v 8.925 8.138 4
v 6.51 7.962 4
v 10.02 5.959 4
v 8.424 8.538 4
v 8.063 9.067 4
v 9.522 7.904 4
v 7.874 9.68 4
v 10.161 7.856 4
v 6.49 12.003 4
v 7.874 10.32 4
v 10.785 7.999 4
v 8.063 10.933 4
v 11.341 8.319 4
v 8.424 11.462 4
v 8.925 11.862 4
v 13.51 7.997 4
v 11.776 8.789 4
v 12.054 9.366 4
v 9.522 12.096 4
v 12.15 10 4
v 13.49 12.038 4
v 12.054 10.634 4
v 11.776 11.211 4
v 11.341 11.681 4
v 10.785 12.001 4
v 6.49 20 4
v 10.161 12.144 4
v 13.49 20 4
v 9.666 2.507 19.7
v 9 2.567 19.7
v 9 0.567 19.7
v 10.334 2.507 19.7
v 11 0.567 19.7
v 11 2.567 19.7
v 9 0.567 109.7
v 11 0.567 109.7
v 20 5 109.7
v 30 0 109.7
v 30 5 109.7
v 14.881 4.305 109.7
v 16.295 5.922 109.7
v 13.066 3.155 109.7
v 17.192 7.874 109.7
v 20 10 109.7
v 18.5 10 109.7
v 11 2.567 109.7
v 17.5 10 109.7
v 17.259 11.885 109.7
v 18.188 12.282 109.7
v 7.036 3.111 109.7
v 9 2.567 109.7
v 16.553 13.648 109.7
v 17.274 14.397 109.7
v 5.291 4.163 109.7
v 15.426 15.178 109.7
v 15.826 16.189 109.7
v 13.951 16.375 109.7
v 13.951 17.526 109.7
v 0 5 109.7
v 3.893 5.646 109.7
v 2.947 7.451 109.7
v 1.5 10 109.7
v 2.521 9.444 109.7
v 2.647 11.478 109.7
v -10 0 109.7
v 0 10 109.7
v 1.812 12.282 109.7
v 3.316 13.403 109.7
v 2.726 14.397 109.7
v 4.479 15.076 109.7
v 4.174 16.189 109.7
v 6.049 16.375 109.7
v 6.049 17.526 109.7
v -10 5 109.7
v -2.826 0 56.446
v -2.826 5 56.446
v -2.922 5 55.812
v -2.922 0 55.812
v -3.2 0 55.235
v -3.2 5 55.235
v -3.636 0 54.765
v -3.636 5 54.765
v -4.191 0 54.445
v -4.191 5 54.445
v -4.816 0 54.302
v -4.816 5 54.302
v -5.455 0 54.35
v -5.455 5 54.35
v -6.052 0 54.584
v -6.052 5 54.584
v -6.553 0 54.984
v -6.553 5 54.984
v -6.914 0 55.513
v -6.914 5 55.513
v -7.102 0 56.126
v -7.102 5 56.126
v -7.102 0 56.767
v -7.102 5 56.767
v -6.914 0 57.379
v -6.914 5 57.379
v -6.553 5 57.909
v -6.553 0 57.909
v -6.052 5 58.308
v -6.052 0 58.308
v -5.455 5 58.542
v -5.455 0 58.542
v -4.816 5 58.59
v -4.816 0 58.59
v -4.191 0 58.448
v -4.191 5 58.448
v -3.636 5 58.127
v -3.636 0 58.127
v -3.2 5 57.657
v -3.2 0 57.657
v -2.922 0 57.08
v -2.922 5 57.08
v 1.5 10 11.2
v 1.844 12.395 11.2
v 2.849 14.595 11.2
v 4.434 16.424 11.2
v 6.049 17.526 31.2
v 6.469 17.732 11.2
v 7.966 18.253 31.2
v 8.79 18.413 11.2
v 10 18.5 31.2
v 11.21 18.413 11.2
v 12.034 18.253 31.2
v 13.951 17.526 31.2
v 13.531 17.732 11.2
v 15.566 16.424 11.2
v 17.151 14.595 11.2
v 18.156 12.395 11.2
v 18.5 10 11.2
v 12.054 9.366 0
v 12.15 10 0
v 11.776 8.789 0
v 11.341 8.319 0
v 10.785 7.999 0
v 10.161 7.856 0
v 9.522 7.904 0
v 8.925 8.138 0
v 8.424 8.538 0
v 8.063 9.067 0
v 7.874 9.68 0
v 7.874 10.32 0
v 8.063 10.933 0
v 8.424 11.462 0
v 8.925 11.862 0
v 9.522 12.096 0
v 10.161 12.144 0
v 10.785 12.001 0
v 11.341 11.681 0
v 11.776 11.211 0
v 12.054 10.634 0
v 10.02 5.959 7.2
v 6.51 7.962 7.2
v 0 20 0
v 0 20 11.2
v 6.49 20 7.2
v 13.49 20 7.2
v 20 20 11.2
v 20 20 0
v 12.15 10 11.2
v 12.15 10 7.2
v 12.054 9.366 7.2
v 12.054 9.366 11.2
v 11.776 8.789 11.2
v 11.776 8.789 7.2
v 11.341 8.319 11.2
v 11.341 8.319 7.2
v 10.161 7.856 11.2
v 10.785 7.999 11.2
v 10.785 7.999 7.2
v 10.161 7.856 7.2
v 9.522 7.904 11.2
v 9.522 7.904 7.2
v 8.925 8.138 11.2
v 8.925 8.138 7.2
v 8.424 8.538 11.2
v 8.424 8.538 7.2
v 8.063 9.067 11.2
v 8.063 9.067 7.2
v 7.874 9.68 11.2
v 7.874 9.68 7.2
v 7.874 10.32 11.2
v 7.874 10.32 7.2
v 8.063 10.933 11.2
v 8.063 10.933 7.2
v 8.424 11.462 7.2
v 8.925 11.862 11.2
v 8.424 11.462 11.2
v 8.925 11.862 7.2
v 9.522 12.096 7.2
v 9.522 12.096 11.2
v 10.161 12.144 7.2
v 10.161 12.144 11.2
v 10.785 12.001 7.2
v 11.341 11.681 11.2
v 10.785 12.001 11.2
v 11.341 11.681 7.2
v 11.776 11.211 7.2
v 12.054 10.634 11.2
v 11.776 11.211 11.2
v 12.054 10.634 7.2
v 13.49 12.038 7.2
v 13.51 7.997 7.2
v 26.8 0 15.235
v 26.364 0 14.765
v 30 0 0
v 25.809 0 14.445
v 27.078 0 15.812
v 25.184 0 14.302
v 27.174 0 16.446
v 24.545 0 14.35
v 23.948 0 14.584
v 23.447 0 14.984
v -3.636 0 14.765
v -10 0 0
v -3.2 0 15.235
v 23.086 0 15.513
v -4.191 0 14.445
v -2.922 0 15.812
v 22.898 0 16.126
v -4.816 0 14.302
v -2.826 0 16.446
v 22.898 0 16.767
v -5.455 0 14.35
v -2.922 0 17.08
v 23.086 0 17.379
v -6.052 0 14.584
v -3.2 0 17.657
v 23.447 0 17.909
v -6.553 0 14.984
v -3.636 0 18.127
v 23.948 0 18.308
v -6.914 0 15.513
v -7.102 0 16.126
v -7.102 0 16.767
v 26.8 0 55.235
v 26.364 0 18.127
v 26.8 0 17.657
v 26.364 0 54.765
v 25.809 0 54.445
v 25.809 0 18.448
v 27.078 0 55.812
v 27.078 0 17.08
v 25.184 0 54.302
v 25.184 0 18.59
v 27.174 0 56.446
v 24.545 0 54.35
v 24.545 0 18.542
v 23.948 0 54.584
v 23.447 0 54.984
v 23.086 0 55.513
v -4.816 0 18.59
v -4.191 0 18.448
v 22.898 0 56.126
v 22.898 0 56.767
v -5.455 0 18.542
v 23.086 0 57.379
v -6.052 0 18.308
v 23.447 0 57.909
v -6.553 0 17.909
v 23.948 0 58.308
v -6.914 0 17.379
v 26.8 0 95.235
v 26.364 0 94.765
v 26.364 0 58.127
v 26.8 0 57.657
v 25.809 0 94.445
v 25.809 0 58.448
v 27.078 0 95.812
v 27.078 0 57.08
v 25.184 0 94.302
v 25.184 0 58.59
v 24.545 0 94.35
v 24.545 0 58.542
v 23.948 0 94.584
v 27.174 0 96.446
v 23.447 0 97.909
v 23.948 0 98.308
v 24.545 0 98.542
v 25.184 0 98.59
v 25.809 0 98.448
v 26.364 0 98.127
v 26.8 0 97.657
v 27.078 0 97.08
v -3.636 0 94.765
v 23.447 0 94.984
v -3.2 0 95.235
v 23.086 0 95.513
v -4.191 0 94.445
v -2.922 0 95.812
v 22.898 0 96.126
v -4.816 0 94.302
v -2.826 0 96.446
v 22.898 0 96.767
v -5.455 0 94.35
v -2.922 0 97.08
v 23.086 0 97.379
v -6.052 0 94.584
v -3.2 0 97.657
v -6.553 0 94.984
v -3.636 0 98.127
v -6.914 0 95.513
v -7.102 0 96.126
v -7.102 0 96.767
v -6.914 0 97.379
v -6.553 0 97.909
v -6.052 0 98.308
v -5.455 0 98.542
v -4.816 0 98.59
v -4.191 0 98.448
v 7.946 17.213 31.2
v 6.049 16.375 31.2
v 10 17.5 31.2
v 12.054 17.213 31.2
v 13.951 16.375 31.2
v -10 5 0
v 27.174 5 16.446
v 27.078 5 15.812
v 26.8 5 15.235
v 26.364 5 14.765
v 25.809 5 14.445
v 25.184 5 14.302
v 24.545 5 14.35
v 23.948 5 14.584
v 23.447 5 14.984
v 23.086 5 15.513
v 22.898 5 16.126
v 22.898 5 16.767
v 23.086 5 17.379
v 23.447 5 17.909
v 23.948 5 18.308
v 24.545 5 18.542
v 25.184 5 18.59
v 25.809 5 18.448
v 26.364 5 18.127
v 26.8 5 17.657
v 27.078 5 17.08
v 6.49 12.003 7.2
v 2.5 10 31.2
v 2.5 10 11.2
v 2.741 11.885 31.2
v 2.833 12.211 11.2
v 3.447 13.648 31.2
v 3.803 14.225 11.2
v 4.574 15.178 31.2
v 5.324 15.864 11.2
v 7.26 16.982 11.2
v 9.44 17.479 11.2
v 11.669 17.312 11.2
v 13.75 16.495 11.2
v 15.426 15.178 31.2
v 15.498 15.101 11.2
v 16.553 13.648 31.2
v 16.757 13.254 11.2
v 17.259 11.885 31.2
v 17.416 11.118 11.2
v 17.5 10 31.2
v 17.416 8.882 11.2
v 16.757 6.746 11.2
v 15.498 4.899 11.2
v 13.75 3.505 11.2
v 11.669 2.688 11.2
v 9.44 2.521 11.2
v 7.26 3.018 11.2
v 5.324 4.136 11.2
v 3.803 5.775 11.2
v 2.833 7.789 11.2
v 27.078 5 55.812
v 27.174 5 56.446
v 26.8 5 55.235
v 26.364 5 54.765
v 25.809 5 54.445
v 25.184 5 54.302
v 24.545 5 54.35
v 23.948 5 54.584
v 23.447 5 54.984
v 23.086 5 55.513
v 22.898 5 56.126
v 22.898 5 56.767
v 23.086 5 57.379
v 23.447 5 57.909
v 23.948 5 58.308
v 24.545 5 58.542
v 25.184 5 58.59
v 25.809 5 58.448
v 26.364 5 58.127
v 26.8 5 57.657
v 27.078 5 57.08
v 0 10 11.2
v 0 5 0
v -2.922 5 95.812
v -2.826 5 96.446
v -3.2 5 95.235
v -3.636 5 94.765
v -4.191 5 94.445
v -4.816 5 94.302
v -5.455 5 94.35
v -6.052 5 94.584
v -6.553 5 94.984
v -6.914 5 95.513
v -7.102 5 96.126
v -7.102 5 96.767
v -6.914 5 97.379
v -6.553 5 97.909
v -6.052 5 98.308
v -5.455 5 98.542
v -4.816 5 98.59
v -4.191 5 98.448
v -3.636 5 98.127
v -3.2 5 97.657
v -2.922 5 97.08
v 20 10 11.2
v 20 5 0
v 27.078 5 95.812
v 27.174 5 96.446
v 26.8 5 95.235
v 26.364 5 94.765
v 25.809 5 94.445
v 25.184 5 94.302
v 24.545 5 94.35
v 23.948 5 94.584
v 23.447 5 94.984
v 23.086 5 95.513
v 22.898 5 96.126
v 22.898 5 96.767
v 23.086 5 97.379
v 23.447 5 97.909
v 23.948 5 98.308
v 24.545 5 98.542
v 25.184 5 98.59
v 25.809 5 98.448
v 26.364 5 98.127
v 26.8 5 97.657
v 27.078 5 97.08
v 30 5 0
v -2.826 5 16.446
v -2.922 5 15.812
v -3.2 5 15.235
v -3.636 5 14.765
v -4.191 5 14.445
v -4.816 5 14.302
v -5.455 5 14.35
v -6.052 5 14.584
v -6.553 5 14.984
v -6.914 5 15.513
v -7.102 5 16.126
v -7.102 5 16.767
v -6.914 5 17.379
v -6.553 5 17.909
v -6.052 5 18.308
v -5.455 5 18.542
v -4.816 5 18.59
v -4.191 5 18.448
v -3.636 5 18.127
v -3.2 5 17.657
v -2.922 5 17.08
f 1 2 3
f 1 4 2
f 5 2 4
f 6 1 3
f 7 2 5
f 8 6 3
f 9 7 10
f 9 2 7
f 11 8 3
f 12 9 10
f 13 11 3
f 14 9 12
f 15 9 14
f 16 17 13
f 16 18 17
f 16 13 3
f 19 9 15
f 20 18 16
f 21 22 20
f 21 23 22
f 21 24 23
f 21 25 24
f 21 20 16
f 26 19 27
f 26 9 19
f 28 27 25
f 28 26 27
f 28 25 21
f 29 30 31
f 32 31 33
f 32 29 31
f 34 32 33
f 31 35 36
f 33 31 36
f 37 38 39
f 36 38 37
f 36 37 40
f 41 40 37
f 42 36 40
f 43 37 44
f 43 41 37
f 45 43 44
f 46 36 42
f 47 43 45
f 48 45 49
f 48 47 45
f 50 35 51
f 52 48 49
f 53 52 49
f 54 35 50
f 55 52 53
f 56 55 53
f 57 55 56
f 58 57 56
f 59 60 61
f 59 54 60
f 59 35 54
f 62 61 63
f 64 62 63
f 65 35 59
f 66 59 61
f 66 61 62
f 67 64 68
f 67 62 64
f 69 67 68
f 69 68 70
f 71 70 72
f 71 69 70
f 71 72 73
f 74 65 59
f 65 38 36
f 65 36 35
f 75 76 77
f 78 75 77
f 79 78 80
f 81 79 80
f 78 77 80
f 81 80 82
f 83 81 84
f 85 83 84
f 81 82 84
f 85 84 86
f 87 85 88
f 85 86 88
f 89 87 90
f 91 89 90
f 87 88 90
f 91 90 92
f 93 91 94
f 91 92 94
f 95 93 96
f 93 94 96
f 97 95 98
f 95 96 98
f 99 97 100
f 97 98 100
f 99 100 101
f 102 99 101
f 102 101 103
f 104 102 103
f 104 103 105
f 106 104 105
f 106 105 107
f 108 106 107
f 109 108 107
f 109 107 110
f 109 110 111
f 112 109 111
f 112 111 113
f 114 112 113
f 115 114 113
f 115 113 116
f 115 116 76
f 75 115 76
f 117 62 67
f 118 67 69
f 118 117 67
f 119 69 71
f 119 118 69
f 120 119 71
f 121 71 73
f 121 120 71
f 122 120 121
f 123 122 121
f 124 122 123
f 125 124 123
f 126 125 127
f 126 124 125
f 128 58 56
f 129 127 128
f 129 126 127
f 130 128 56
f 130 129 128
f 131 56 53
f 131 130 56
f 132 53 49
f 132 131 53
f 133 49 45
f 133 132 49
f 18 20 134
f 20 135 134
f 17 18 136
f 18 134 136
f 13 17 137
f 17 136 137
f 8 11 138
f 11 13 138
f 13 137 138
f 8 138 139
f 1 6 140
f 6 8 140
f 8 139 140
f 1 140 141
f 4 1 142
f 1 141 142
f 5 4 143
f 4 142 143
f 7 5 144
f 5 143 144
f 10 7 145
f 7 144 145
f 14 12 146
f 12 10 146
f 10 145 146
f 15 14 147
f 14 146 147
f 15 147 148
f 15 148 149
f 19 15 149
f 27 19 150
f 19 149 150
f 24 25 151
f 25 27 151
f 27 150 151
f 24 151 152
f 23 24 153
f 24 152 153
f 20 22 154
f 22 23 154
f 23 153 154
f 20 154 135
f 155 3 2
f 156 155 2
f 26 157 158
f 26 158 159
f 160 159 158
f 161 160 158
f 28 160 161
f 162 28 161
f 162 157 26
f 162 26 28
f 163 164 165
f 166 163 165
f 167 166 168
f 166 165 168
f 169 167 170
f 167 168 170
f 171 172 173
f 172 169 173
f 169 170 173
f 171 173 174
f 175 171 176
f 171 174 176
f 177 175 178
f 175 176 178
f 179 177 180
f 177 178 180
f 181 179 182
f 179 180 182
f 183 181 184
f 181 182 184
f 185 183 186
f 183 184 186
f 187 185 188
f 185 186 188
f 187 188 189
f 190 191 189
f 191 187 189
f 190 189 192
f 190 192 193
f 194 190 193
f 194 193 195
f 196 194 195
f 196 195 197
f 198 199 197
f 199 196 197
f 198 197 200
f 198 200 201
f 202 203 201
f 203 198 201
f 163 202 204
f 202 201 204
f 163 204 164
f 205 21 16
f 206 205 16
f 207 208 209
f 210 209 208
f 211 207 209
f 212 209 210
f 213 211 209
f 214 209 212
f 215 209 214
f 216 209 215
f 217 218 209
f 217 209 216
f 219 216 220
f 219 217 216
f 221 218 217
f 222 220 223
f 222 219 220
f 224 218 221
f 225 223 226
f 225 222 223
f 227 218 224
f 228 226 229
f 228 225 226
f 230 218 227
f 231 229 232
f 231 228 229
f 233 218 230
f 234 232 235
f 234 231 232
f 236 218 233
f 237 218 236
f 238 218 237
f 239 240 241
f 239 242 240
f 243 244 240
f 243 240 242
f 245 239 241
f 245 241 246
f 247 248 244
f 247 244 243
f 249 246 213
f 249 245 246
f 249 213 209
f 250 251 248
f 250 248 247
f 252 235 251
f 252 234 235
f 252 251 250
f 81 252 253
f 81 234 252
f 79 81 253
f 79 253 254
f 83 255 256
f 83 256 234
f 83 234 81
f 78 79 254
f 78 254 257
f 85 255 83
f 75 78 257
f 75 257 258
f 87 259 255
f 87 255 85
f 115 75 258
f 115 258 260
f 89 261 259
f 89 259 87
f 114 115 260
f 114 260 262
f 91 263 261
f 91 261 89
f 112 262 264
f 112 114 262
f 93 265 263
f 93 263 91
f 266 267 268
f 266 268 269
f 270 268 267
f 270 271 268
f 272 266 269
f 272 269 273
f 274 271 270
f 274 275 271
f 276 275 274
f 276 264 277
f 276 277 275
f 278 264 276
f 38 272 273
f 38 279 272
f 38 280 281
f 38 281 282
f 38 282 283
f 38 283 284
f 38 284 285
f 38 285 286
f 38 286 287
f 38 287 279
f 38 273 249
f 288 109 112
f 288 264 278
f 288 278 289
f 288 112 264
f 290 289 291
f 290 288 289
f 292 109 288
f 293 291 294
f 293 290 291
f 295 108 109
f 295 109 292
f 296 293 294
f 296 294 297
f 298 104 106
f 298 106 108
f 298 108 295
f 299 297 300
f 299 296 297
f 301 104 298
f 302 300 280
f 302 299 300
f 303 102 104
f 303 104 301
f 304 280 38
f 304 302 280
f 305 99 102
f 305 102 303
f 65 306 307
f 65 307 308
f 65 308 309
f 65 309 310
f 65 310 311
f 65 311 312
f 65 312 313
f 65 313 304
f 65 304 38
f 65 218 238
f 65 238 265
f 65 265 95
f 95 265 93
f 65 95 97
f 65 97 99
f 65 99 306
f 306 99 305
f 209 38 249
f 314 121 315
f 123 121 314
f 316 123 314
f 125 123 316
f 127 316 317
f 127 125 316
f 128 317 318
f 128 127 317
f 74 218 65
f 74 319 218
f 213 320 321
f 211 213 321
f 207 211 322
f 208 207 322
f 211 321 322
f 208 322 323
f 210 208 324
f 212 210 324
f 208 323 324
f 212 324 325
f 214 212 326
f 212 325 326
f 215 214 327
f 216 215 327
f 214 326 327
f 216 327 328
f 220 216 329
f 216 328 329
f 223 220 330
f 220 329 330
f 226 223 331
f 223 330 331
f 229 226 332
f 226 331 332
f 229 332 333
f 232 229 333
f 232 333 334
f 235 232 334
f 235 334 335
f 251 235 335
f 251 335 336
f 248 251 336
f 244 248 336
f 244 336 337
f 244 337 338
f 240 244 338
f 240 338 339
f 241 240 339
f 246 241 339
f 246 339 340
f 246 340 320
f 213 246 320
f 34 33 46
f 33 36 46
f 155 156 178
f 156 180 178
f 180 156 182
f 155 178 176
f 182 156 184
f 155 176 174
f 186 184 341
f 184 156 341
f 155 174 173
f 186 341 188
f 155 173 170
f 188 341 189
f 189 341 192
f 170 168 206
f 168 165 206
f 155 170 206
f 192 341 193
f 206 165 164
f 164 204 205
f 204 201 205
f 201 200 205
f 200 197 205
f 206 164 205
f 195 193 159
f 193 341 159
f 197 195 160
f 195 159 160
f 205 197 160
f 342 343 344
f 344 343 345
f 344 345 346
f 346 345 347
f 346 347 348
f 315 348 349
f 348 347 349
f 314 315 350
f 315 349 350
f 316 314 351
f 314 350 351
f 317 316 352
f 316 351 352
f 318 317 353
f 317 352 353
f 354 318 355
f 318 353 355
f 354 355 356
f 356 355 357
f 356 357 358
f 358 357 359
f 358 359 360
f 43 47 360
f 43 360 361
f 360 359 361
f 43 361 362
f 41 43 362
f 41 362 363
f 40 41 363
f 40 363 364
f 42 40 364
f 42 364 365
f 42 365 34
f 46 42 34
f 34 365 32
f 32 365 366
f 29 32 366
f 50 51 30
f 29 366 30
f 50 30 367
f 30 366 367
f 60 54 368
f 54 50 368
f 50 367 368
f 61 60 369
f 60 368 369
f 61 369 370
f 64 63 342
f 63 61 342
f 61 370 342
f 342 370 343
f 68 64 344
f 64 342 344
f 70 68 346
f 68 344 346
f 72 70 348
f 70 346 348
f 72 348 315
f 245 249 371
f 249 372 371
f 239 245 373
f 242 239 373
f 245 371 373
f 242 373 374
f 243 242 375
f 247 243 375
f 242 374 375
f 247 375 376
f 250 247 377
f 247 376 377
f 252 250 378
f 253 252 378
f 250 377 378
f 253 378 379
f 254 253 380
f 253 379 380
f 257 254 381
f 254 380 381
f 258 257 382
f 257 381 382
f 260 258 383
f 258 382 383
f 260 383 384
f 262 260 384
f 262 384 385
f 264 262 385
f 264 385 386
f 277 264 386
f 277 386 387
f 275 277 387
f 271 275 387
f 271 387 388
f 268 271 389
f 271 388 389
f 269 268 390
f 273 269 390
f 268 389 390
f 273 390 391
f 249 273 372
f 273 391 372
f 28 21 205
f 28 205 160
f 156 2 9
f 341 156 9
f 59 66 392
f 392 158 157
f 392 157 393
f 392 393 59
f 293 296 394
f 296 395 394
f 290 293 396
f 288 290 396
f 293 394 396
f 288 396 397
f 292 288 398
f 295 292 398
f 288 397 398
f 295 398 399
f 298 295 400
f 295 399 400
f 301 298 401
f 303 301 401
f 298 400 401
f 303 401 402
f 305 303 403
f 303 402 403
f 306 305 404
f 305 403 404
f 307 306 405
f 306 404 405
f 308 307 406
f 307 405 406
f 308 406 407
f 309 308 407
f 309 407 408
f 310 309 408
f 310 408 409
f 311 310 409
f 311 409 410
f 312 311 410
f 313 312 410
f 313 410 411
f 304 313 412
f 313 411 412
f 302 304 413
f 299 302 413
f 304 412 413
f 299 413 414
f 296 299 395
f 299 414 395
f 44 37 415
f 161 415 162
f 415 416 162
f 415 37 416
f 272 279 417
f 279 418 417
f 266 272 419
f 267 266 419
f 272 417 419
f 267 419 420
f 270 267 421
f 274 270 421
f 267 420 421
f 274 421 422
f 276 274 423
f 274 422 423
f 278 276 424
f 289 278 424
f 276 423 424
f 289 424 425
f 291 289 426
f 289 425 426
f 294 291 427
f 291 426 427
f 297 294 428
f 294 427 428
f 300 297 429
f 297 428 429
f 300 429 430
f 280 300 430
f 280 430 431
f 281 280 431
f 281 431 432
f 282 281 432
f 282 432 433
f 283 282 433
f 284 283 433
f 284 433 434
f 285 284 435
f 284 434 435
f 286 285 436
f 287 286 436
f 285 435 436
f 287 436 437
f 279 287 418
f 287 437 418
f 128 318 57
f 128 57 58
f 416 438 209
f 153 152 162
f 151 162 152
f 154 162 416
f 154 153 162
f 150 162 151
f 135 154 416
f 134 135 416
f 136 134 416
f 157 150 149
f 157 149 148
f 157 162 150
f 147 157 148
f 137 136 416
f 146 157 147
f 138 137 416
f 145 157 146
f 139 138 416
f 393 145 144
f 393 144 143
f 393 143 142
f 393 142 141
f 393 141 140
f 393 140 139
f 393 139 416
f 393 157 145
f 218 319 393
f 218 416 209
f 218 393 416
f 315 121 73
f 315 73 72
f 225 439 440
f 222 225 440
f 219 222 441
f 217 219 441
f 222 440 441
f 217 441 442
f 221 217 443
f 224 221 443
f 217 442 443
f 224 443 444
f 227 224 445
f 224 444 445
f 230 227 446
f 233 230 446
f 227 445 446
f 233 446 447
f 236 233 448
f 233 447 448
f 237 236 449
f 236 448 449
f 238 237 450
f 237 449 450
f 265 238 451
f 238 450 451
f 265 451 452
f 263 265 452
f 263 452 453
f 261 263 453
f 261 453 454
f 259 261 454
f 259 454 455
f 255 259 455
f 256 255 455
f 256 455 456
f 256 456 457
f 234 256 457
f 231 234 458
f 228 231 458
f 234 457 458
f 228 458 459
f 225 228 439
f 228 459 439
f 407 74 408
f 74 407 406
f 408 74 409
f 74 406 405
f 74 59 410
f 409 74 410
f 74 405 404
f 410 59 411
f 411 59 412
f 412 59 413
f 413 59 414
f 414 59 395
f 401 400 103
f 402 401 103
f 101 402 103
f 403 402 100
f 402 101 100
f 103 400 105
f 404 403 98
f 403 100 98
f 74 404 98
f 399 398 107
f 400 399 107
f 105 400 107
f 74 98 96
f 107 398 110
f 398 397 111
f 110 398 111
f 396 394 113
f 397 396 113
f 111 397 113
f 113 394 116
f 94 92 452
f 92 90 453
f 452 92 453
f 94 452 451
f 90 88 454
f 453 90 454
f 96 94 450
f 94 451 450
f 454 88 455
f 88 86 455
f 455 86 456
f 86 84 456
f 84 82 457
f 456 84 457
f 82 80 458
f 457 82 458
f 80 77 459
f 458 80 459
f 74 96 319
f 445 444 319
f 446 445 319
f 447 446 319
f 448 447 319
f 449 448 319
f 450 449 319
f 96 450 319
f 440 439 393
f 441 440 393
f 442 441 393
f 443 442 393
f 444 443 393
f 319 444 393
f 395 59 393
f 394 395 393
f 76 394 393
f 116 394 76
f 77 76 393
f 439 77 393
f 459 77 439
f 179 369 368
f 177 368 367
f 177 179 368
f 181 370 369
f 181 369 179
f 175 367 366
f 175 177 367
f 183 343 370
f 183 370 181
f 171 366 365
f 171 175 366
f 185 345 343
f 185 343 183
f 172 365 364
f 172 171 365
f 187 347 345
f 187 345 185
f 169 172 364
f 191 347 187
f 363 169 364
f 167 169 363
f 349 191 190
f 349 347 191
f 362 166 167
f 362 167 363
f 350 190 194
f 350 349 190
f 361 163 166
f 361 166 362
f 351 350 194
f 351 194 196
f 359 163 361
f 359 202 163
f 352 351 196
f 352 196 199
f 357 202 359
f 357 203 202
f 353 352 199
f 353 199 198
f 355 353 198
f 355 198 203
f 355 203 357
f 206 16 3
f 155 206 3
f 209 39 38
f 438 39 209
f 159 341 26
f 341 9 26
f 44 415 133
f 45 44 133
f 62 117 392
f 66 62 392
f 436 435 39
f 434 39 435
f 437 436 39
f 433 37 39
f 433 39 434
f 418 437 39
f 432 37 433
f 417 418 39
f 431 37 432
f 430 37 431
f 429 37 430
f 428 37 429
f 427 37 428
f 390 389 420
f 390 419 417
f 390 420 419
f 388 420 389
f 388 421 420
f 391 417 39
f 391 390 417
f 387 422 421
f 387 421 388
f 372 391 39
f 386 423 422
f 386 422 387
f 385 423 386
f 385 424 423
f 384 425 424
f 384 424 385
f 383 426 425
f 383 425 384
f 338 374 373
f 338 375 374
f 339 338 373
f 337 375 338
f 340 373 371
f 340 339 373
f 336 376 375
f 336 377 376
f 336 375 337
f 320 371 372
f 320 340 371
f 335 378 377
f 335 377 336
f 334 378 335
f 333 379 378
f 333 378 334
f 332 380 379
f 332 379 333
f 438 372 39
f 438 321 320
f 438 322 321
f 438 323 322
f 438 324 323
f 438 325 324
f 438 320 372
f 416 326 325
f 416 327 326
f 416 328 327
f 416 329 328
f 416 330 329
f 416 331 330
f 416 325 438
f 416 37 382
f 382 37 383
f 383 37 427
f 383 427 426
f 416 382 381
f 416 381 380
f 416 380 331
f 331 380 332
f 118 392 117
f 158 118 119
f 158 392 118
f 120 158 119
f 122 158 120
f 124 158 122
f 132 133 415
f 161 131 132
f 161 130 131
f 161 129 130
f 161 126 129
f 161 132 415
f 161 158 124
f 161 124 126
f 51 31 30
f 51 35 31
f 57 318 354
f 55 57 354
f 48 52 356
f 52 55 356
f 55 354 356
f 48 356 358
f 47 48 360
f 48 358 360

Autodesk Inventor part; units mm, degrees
ref_plane "YZ Plane" through (0, 0, 0) normal (1, 0, 0) x (0, 1, 0)
ref_plane "XZ Plane" through (0, 0, 0) normal (0, 1, 0) x (-1, 0, 0)
ref_plane "XY Plane" through (0, 0, 0) normal (0, 0, 1) x (1, 0, 0)
sketch "Esquisse1" plane through (0, 0, 0) normal (0, 0, 1) x (1, 0, 0)
  line L0 (0, 0) -> (20, 0)
  line L1 (20, 0) -> (20, 20)
  line L2 (20, 20) -> (0, 20)
  line L3 (0, 20) -> (0, 0)
  circle A0 centre (10, 10) radius 2.15
  dimension "d0" = 20
  dimension "d1" = 20
  dimension "d2" = 4.3
extrude "Extrusion1" add sketch "Esquisse1" along normal blind 4
sketch "Esquisse2" plane through (0, 0, 4) normal (0, 0, 1) x (1, 0, 0)
  circle A0 centre (10, 10) radius 2.15 projected
  line L0 (0, 20) -> (0, 0) projected
  circle A1 centre (10, 10) radius 2.15 projected
  line L1 (0, 0) -> (20, 0) projected
  line L2 (20, 0) -> (20, 20) projected
  line L3 (20, 20) -> (0, 20) projected
  line L4 (0, 20) -> (0, 0) projected
  line L5 (13.4897, 12.0384) -> (13.5102, 7.997)
  line L6 (13.5102, 7.997) -> (10.0204, 5.9586)
  line L7 (10.0204, 5.9586) -> (6.5103, 7.9616)
  line L8 (6.5103, 7.9616) -> (6.4898, 12.003)
  line L9 (6.4898, 12.003) -> (6.4898, 20)
  line L10 (20, 20) -> (0, 20) projected
  line L11 (13.4897, 12.0384) -> (13.4897, 20)
  line L12 (6.4898, 20) -> (0, 20)
  line L13 (0, 0) -> (20, 0) projected
  line L14 (0, 0) -> (0, 20)
  line L15 (0, 0) -> (20, 0)
  line L16 (20, 0) -> (20, 20)
  line L17 (20, 20) -> (13.4897, 20)
  dimension "d5" = 7
  dimension "d6" = 0.29
extrude "Extrusion2" add sketch "Esquisse2" along normal blind 3.2 contours L3 L9 L8 L7 L6 L5 L11 L2 L1 L0
sketch "Esquisse3" plane through (0, 0, 7.2) normal (0, 0, 1) x (1, 0, 0)
  line L0 (6.4898, 20) -> (0, 20) projected
  line L1 (0, 20) -> (20, 20)
  line L2 (20, 20) -> (20, 0)
  line L3 (20, 0) -> (0, 0)
  line L4 (0, 0) -> (0, 20)
  circle A0 centre (10, 10) radius 2.15 projected
  circle A1 centre (10, 10) radius 2.15
  point P0 (0, 0)
extrude "Extrusion4" add sketch "Esquisse3" along normal blind 4
sketch "Esquisse4" plane through (0, 0, 11.2) normal (0, 0, 1) x (1, 0, 0)
  line L0 (0, 20) -> (0, 0) projected
  line L1 (0, 10) -> (0, 0)
  line L2 (0, 0) -> (20, 0)
  line L3 (20, 0) -> (20, 10)
  line L4 (20, 0) -> (20, 20) projected
  line L5 (10, 10) -> (2.5, 10) construction
  line L6 (2.5, 10) -> (17.5, 10) construction
  arc A0 (2.5, 10) -> (17.5, 10) centre (10, 10) ccw
  arc A1 (17.5, 10) -> (2.5, 10) centre (10, 10) ccw
  line L7 (0, 10) -> (0, 20)
  line L8 (20, 20) -> (0, 20) projected
  line L9 (0, 20) -> (20, 20)
  line L10 (20, 20) -> (20, 10)
  line L11 (0, 10) -> (1.5, 10)
  line L12 (18.5, 10) -> (20, 10)
  arc A2 (18.5, 10) -> (1.5, 10) centre (10, 10) ccw
  dimension "d15" = 7.5
  dimension "d16" = 1
extrude "Extrusion5" add sketch "Esquisse4" along normal blind 20 contours L11 A2 L12 L3 L2 L0
sketch "Esquisse5" plane through (0, 0, 31.2) normal (0, 0, 1) x (1, 0, 0)
  circle A0 centre (10, 10) radius 7.5 projected
  line L0 (0, 0) -> (20, 0) projected
  line L1 (20, 0) -> (20, 10) projected
  line L2 (20, 10) -> (18.5, 10) projected
  arc A1 (18.5, 10) -> (1.5, 10) centre (10, 10) ccw projected
  line L3 (1.5, 10) -> (0, 10) projected
  line L4 (0, 10) -> (0, 0) projected
  arc A2 (18.5, 10) -> (1.5, 10) centre (10, 10) ccw projected
  line L5 (6.0494, 17.5262) -> (6.0494, 16.3752)
  line L6 (13.9506, 16.3752) -> (13.9506, 17.5262)
  arc A3 (18.5, 10) -> (1.5, 10) centre (10, 10) ccw projected
  circle A4 centre (10, 10) radius 7.5 projected
extrude "Extrusion6" add sketch "Esquisse5" along normal blind 78.5 contours A0 L6 A1 L2 L1 L0 L4 L3 L5
sketch "Esquisse6" plane through (0, 0, 109.7) normal (0, 0, 1) x (1, 0, 0)
  arc A0 (6.0494, 16.3752) -> (13.9506, 16.3752) centre (10, 10) ccw projected
  line L0 (0, 0) -> (20, 0) projected
  line L1 (11, 0.567) -> (11, 2.567)
  line L2 (9, 0.567) -> (9, 2.567)
  arc A1 (9, 2.567) -> (11, 2.567) centre (10, 10) ccw
  line L3 (9, 0.567) -> (11, 0.567)
  dimension "d23" = 2
  dimension "d24" = 2
extrude "Extrusion7" cut sketch "Esquisse6" against normal blind 90
sketch "Esquisse7" plane through (0, 0, 0) normal (-1, 0, 0) x (0, 0, 1)
  point P0 (0, 0)
sketch "Esquisse8" plane through (0, 0, 0) normal (-1, 0, 0) x (0, 0, 1)
  line L0 (109.7, 0) -> (109.7, 10) projected
  line L1 (0, 0) -> (109.7, 0)
  line L2 (109.7, 0) -> (109.7, 5)
  line L3 (109.7, 5) -> (0, 5)
  line L4 (0, 5) -> (0, 0)
extrude "Extrusion8" add sketch "Esquisse8" along normal blind 10
sketch "Esquisse9" plane through (20, 0, 0) normal (1, 0, 0) x (0, 0, -1)
  line L0 (-109.7, 0) -> (-109.7, 10) projected
  line L1 (0, 0) -> (-109.7, 0)
  line L2 (-109.7, 0) -> (-109.7, 5)
  line L3 (-109.7, 5) -> (0, 5)
  line L4 (0, 5) -> (0, 0)
extrude "Extrusion9" add sketch "Esquisse9" along normal blind 10
sketch "Esquisse10" plane through (20, 5, 109.7) normal (0, 1, 0) x (1, 0, 0)
  line L0 (10.0235, 93.2538) -> (5.0235, 93.2538) construction
  line L1 (0, 98.5) -> (0, 0) construction
  line L2 (5.0235, 93.2538) -> (5.0235, 8.1061) construction
  circle A0 centre (5.0235, 93.2538) radius 2.15
  circle A1 centre (5.0235, 53.2538) radius 2.15
  circle A2 centre (5.0235, 13.2538) radius 2.15
  circle A3 centre (-24.9765, 93.2538) radius 2.15
  circle A4 centre (-24.9765, 53.2538) radius 2.15
  circle A5 centre (-24.9765, 13.2538) radius 2.15
  point P0 (-20, 109.7)
  dimension "d31" = 5
  dimension "d32" = 4.3
  dimension "d35" = 40
  dimension "d38" = 30
extrude "Extrusion10" cut sketch "Esquisse10" against normal blind 10
sketch "Esquisse11" plane through (0, 0, 109.7) normal (0, 0, 1) x (1, 0, 0)
  line L0 (9, 0.567) -> (9, 2.567) projected
  arc A0 (6.0494, 16.3752) -> (9, 2.567) centre (10, 10) ccw projected
  line L1 (6.0494, 16.3752) -> (6.0494, 17.5262) projected
  arc A1 (6.0494, 17.5262) -> (1.5, 10) centre (10, 10) ccw projected
  line L2 (1.5, 10) -> (0, 10) projected
  line L3 (0, 10) -> (0, 5) projected
  line L4 (0, 5) -> (-10, 5) projected
  line L5 (-10, 0) -> (-10, 5) projected
  line L6 (30, 0) -> (-10, 0) projected
  line L7 (30, 5) -> (30, 0) projected
  line L8 (20, 5) -> (30, 5) projected
  line L9 (20, 5) -> (20, 10) projected
  line L10 (20, 10) -> (18.5, 10) projected
  arc A2 (18.5, 10) -> (13.9506, 17.5262) centre (10, 10) ccw projected
  line L11 (13.9506, 17.5262) -> (13.9506, 16.3752) projected
  arc A3 (11, 2.567) -> (13.9506, 16.3752) centre (10, 10) ccw projected
  line L12 (11, 2.567) -> (11, 0.567) projected
  line L13 (11, 0.567) -> (9, 0.567) projected
  point P0 (0, 0)
ref_plane "Plan de construction1" through (17.5, 10, 11.2) normal (1, 0, 0) x (0, 1, 0)
ref_plane "Plan de construction2" through (20, 20, 11.2) normal (1, 0, 0) x (0, 0, -1)
properties part number "lanceur"
